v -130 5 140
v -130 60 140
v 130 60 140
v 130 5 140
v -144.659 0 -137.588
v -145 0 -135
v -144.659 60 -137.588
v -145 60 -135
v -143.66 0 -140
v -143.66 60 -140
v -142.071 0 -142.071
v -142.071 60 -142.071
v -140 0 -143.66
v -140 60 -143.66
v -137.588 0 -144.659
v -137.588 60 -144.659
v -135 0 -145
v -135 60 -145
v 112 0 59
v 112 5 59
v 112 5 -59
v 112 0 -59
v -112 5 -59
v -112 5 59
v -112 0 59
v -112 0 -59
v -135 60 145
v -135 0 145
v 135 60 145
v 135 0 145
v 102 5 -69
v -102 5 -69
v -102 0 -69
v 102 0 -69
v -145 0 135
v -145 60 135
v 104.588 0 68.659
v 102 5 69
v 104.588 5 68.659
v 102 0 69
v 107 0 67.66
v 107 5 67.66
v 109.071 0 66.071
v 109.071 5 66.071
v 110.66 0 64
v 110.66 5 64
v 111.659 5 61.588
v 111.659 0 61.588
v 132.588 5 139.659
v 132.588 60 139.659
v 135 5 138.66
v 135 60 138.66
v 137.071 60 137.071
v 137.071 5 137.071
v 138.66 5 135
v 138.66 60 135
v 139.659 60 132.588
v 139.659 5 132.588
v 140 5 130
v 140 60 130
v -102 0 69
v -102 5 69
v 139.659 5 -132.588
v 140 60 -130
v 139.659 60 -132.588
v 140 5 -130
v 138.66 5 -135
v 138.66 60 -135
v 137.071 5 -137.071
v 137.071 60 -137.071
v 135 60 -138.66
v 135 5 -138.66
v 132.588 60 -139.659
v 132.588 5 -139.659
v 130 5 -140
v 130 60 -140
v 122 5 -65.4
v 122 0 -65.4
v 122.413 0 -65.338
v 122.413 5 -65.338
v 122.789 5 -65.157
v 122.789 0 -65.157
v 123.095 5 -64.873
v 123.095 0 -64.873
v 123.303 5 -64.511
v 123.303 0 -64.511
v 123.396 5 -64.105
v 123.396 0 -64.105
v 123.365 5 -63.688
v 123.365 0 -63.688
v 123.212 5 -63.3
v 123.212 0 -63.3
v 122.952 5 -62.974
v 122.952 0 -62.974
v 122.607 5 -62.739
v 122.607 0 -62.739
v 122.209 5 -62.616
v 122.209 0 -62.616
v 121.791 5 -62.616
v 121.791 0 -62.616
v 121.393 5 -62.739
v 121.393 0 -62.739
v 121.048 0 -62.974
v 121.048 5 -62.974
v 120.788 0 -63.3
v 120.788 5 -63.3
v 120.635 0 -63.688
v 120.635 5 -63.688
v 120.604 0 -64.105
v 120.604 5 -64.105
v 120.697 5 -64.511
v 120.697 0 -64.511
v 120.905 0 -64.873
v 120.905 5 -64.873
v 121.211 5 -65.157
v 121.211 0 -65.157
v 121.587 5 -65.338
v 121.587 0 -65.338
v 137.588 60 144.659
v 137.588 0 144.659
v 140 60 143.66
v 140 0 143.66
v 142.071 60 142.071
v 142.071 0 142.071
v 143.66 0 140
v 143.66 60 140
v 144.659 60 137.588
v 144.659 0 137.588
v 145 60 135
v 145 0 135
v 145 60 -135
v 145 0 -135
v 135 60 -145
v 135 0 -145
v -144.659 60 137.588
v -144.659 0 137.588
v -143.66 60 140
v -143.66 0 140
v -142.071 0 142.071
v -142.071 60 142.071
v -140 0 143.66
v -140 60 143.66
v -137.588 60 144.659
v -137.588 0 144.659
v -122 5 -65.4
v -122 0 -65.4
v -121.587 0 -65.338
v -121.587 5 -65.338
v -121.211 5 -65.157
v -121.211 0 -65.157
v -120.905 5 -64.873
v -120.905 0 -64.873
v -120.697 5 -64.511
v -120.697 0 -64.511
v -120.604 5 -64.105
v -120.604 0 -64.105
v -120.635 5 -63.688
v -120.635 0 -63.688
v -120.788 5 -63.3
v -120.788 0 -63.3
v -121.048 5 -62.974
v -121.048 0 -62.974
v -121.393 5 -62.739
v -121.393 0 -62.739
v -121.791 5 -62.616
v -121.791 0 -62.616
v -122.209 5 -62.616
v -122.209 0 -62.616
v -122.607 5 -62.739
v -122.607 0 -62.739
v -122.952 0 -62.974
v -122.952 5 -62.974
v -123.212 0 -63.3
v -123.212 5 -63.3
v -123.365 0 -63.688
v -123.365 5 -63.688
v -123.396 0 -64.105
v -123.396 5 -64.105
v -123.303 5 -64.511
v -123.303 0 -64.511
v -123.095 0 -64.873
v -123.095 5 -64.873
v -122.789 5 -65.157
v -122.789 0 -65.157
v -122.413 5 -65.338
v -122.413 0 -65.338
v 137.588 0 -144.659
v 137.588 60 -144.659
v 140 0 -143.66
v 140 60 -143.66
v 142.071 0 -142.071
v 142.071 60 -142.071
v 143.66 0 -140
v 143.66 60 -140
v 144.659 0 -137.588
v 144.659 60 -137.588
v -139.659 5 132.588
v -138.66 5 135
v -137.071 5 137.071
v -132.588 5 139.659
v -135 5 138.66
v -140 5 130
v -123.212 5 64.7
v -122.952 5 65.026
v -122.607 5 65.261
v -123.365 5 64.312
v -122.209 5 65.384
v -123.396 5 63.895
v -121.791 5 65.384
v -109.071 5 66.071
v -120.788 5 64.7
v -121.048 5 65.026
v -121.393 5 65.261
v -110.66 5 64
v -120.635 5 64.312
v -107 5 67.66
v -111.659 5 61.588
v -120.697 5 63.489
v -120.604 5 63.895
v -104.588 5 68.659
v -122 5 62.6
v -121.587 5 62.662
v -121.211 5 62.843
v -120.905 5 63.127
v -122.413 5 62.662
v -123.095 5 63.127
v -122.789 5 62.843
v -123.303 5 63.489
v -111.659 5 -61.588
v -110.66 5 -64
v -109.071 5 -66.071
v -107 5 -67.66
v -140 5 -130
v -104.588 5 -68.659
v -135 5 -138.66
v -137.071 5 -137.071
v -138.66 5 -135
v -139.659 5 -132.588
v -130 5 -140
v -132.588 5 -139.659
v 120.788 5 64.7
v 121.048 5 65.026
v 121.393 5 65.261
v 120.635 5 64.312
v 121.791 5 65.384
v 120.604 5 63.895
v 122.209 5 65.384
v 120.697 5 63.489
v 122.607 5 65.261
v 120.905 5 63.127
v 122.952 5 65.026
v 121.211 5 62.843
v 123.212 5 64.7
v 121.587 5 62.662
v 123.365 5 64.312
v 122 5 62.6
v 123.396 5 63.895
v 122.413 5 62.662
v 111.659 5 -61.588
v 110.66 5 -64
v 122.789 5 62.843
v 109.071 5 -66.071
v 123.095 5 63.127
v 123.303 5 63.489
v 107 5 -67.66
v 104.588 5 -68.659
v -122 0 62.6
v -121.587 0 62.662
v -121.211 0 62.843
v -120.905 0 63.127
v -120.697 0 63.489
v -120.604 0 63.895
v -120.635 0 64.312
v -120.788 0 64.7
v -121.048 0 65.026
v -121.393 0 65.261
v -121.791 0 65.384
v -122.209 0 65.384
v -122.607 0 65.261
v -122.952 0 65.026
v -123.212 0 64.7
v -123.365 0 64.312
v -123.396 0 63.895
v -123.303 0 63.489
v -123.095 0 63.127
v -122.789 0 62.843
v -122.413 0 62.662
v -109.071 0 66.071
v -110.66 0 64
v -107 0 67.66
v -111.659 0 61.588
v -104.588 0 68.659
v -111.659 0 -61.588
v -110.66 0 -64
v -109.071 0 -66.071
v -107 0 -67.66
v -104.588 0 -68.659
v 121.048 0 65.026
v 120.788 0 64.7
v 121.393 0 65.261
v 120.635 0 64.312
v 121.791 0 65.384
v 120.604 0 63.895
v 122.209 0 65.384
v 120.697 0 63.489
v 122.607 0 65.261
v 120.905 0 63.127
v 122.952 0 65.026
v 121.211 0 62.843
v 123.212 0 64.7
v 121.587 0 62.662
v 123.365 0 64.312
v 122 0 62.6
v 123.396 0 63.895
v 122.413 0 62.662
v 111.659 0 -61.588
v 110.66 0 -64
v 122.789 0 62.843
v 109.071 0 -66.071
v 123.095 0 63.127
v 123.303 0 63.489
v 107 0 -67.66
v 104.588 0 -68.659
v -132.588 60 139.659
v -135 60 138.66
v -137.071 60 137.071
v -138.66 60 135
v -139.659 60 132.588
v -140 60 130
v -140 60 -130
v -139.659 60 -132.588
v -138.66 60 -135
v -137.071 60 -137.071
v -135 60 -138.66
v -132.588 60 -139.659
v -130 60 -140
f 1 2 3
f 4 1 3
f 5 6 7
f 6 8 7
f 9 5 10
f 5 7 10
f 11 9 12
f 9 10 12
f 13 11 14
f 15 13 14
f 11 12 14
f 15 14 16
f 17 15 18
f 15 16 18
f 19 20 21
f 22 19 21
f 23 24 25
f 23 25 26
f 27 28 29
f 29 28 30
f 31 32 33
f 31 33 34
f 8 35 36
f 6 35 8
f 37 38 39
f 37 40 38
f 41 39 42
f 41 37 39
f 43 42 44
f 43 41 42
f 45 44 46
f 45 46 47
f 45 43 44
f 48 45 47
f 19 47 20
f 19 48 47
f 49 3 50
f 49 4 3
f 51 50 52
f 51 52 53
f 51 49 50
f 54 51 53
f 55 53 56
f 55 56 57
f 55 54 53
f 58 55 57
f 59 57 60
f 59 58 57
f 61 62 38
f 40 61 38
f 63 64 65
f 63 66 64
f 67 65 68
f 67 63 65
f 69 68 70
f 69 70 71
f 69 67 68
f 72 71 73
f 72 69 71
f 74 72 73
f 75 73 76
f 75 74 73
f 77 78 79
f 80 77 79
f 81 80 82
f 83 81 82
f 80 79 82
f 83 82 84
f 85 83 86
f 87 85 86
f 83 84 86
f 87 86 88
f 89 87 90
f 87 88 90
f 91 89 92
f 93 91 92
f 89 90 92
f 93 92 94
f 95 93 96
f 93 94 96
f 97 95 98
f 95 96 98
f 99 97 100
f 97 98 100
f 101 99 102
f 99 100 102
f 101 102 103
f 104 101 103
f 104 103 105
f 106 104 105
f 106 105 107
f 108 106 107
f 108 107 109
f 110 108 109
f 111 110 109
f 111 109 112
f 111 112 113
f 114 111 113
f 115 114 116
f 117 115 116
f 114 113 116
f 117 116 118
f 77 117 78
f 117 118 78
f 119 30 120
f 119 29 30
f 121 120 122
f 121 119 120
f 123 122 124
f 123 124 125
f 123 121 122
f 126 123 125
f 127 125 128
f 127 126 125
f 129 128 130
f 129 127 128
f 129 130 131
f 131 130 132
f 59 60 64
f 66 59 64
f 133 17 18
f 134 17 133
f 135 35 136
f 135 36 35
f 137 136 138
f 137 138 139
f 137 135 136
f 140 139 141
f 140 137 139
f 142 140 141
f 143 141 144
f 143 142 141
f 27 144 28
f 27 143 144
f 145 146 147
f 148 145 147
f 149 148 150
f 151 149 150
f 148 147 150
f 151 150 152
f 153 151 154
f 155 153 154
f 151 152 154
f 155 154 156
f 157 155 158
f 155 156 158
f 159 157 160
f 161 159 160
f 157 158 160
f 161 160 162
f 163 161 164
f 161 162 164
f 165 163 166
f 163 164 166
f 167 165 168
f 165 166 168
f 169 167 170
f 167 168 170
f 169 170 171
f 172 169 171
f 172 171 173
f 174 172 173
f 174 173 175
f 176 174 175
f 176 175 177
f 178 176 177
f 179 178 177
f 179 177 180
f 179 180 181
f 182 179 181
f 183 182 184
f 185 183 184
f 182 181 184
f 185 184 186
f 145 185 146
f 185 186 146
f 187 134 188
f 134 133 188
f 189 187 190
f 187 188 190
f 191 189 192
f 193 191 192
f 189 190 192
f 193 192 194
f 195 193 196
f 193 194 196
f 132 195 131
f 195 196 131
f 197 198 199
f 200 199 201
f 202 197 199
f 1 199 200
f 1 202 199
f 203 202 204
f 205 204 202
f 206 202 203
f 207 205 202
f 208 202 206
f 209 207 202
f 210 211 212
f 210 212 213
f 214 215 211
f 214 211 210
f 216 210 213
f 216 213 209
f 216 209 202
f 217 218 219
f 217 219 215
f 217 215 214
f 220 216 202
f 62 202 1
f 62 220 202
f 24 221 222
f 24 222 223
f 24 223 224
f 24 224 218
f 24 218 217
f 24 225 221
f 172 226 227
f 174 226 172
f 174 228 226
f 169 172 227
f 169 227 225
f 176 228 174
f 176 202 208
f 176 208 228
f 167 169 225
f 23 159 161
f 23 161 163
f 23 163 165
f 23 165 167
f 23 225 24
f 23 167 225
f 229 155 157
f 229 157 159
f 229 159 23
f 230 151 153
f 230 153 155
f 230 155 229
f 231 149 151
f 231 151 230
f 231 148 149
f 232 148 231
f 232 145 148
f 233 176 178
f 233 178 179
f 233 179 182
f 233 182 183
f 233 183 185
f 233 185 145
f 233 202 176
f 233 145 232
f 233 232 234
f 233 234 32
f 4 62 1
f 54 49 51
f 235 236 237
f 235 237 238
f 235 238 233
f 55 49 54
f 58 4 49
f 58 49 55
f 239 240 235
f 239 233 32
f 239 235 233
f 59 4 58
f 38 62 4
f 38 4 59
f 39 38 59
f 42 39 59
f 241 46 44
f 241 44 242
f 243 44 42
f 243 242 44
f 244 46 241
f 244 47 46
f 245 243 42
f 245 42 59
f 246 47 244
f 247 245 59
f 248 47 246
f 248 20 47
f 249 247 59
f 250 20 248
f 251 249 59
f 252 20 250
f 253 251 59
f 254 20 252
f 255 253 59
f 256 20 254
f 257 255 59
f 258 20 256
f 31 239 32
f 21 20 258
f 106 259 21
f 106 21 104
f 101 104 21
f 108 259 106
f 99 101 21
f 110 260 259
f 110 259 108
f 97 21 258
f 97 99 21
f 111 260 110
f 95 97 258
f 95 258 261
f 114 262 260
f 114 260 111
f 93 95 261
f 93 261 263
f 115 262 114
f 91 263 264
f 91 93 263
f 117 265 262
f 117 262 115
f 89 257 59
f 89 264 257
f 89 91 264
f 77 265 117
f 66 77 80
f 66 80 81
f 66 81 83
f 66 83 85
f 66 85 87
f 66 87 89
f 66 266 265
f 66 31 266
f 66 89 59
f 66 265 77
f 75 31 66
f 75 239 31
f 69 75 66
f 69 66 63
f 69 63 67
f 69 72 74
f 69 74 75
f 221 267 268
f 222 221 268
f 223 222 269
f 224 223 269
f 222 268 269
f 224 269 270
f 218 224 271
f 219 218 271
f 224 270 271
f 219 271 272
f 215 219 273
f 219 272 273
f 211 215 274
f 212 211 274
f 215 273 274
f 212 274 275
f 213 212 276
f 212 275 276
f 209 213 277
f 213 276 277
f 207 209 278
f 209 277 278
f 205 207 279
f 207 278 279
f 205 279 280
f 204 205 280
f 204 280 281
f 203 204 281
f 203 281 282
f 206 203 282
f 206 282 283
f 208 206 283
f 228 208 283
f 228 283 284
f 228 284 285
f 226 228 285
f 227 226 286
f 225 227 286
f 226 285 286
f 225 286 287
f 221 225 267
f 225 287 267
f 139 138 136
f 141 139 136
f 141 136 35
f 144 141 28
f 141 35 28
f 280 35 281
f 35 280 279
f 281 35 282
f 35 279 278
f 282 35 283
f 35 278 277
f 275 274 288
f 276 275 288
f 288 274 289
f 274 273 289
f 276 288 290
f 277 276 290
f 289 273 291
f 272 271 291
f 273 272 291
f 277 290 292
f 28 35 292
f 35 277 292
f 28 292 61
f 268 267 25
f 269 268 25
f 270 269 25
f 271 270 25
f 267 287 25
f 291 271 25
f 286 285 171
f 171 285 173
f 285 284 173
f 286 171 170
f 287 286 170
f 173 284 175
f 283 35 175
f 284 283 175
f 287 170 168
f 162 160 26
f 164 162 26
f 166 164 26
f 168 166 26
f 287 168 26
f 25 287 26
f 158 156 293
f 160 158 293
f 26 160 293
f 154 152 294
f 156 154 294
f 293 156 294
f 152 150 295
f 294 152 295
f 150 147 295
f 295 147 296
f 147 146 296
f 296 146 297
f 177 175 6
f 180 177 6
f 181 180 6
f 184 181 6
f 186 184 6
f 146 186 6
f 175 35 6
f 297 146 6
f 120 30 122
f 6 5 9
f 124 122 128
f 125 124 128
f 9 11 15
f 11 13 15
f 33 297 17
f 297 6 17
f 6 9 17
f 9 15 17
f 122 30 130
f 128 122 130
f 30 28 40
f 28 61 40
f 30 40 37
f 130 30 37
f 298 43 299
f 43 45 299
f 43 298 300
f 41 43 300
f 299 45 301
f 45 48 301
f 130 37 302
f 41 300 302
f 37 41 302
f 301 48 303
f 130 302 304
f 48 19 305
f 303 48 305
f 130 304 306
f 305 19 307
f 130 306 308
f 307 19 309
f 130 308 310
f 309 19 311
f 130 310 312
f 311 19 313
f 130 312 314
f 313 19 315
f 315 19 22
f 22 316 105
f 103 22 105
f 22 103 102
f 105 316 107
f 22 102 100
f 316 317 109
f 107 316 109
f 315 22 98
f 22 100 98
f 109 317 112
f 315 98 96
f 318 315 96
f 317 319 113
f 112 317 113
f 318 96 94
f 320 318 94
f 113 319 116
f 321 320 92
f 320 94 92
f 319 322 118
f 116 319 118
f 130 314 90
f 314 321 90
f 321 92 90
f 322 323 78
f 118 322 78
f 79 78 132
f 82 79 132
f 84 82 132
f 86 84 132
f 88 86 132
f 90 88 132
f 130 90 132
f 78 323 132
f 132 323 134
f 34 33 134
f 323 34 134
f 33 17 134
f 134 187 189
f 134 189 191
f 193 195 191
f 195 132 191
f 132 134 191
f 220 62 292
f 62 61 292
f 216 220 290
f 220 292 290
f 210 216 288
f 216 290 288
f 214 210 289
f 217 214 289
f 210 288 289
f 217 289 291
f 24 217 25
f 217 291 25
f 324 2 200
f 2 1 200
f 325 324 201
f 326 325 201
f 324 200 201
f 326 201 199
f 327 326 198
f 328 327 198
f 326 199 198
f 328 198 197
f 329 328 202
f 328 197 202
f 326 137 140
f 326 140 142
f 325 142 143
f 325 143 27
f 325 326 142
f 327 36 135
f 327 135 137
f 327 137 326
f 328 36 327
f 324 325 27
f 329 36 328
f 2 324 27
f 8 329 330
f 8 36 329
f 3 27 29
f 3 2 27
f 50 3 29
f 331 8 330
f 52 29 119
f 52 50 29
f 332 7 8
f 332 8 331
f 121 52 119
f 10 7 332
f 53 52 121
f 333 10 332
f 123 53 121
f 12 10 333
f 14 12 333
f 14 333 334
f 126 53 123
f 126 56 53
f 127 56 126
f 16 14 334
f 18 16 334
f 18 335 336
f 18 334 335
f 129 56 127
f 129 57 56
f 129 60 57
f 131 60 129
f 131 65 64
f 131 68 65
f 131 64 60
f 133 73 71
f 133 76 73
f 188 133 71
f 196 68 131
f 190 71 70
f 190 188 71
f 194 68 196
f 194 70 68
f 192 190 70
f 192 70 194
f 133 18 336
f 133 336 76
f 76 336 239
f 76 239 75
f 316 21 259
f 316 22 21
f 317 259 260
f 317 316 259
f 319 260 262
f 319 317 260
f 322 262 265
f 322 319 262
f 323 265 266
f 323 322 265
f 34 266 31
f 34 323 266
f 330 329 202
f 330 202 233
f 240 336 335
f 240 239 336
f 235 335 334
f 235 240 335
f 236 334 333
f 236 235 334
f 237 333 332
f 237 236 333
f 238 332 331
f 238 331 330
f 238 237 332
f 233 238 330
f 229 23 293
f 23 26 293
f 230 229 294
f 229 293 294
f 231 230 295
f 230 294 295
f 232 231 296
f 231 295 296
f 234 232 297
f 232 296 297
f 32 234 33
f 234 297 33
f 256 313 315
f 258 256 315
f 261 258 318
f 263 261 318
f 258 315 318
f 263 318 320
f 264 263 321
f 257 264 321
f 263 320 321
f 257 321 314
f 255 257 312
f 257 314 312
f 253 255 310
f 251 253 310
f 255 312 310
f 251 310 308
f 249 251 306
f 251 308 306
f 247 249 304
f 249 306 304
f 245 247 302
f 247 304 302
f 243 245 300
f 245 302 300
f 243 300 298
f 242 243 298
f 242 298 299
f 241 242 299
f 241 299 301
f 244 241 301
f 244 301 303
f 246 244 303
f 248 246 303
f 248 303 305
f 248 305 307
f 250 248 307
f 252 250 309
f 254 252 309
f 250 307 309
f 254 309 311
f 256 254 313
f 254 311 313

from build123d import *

# Parameters (mm, degrees)
SKETCH_1_W          = 290
SKETCH_1_H          = 290
EXTRUDE_1_DEPTH     = 60
SKETCH_2_W          = 280
SKETCH_2_H          = 280
CUT_EXTRUDE_2_DEPTH = 55
SKETCH_3_W          = 224
SKETCH_3_H          = 138
CUT_EXTRUDE_3_DEPTH = 5
SKETCH_4_R          = 1.4
CUT_EXTRUDE_4_DEPTH = 5
FILLET_1_R          = 10
FILLET_2_R          = 10


with BuildPart() as part:
    # 草图1 → 凸台-拉伸1 (new body)
    with BuildSketch(Plane(origin=(0, 0, 0), x_dir=(1, 0, 0), z_dir=(0, 1, 0))):
        Rectangle(SKETCH_1_W, SKETCH_1_H)
    extrude(amount=EXTRUDE_1_DEPTH)

    # 草图2 → 切除-拉伸2 (cut)
    with BuildSketch(Plane(origin=(0, 60, 0), x_dir=(1, 0, 0), z_dir=(0, 1, 0))):
        Rectangle(SKETCH_2_W, SKETCH_2_H)
    extrude(amount=-CUT_EXTRUDE_2_DEPTH, mode=Mode.SUBTRACT)

    # 草图3 → 切除-拉伸3 (cut)
    with BuildSketch(Plane(origin=(0, 5, 0), x_dir=(1, 0, 0), z_dir=(0, 1, 0))):
        Rectangle(SKETCH_3_W, SKETCH_3_H)
    extrude(amount=-CUT_EXTRUDE_3_DEPTH, mode=Mode.SUBTRACT)

    # 草图4 → 切除-拉伸4 (cut)
    with BuildSketch(Plane.XZ):
        with Locations(Location((-122, 64, 0), (0, 0, 270))):
            Circle(SKETCH_4_R)
        with Locations(Location((122, 64, 0), (0, 0, 270))):
            Circle(SKETCH_4_R)
        with Locations(Location((122, -64, 0), (0, 0, 270))):
            Circle(SKETCH_4_R)
        with Locations(Location((-122, -64, 0), (0, 0, 270))):
            Circle(SKETCH_4_R)
    extrude(amount=-CUT_EXTRUDE_4_DEPTH, mode=Mode.SUBTRACT)

    # 圆角1
    fillet_1_edges = [part.edges().sort_by_distance(p)[0] for p in [
        (140, 32.5, -140),
        (-140, 32.5, -140),
        (-140, 32.5, 140),
        (140, 32.5, 140),
        (145, 30, 145),
        (-145, 30, 145),
        (-145, 30, -145),
        (145, 30, -145),
    ]]
    fillet(fillet_1_edges, radius=FILLET_1_R)

    # 圆角2
    fillet_2_edges = [part.edges().sort_by_distance(p)[0] for p in [
        (-112, 2.5, -69),
        (-112, 2.5, 69),
        (112, 2.5, 69),
        (112, 2.5, -69),
    ]]
    fillet(fillet_2_edges, radius=FILLET_2_R)


solid = part.part
